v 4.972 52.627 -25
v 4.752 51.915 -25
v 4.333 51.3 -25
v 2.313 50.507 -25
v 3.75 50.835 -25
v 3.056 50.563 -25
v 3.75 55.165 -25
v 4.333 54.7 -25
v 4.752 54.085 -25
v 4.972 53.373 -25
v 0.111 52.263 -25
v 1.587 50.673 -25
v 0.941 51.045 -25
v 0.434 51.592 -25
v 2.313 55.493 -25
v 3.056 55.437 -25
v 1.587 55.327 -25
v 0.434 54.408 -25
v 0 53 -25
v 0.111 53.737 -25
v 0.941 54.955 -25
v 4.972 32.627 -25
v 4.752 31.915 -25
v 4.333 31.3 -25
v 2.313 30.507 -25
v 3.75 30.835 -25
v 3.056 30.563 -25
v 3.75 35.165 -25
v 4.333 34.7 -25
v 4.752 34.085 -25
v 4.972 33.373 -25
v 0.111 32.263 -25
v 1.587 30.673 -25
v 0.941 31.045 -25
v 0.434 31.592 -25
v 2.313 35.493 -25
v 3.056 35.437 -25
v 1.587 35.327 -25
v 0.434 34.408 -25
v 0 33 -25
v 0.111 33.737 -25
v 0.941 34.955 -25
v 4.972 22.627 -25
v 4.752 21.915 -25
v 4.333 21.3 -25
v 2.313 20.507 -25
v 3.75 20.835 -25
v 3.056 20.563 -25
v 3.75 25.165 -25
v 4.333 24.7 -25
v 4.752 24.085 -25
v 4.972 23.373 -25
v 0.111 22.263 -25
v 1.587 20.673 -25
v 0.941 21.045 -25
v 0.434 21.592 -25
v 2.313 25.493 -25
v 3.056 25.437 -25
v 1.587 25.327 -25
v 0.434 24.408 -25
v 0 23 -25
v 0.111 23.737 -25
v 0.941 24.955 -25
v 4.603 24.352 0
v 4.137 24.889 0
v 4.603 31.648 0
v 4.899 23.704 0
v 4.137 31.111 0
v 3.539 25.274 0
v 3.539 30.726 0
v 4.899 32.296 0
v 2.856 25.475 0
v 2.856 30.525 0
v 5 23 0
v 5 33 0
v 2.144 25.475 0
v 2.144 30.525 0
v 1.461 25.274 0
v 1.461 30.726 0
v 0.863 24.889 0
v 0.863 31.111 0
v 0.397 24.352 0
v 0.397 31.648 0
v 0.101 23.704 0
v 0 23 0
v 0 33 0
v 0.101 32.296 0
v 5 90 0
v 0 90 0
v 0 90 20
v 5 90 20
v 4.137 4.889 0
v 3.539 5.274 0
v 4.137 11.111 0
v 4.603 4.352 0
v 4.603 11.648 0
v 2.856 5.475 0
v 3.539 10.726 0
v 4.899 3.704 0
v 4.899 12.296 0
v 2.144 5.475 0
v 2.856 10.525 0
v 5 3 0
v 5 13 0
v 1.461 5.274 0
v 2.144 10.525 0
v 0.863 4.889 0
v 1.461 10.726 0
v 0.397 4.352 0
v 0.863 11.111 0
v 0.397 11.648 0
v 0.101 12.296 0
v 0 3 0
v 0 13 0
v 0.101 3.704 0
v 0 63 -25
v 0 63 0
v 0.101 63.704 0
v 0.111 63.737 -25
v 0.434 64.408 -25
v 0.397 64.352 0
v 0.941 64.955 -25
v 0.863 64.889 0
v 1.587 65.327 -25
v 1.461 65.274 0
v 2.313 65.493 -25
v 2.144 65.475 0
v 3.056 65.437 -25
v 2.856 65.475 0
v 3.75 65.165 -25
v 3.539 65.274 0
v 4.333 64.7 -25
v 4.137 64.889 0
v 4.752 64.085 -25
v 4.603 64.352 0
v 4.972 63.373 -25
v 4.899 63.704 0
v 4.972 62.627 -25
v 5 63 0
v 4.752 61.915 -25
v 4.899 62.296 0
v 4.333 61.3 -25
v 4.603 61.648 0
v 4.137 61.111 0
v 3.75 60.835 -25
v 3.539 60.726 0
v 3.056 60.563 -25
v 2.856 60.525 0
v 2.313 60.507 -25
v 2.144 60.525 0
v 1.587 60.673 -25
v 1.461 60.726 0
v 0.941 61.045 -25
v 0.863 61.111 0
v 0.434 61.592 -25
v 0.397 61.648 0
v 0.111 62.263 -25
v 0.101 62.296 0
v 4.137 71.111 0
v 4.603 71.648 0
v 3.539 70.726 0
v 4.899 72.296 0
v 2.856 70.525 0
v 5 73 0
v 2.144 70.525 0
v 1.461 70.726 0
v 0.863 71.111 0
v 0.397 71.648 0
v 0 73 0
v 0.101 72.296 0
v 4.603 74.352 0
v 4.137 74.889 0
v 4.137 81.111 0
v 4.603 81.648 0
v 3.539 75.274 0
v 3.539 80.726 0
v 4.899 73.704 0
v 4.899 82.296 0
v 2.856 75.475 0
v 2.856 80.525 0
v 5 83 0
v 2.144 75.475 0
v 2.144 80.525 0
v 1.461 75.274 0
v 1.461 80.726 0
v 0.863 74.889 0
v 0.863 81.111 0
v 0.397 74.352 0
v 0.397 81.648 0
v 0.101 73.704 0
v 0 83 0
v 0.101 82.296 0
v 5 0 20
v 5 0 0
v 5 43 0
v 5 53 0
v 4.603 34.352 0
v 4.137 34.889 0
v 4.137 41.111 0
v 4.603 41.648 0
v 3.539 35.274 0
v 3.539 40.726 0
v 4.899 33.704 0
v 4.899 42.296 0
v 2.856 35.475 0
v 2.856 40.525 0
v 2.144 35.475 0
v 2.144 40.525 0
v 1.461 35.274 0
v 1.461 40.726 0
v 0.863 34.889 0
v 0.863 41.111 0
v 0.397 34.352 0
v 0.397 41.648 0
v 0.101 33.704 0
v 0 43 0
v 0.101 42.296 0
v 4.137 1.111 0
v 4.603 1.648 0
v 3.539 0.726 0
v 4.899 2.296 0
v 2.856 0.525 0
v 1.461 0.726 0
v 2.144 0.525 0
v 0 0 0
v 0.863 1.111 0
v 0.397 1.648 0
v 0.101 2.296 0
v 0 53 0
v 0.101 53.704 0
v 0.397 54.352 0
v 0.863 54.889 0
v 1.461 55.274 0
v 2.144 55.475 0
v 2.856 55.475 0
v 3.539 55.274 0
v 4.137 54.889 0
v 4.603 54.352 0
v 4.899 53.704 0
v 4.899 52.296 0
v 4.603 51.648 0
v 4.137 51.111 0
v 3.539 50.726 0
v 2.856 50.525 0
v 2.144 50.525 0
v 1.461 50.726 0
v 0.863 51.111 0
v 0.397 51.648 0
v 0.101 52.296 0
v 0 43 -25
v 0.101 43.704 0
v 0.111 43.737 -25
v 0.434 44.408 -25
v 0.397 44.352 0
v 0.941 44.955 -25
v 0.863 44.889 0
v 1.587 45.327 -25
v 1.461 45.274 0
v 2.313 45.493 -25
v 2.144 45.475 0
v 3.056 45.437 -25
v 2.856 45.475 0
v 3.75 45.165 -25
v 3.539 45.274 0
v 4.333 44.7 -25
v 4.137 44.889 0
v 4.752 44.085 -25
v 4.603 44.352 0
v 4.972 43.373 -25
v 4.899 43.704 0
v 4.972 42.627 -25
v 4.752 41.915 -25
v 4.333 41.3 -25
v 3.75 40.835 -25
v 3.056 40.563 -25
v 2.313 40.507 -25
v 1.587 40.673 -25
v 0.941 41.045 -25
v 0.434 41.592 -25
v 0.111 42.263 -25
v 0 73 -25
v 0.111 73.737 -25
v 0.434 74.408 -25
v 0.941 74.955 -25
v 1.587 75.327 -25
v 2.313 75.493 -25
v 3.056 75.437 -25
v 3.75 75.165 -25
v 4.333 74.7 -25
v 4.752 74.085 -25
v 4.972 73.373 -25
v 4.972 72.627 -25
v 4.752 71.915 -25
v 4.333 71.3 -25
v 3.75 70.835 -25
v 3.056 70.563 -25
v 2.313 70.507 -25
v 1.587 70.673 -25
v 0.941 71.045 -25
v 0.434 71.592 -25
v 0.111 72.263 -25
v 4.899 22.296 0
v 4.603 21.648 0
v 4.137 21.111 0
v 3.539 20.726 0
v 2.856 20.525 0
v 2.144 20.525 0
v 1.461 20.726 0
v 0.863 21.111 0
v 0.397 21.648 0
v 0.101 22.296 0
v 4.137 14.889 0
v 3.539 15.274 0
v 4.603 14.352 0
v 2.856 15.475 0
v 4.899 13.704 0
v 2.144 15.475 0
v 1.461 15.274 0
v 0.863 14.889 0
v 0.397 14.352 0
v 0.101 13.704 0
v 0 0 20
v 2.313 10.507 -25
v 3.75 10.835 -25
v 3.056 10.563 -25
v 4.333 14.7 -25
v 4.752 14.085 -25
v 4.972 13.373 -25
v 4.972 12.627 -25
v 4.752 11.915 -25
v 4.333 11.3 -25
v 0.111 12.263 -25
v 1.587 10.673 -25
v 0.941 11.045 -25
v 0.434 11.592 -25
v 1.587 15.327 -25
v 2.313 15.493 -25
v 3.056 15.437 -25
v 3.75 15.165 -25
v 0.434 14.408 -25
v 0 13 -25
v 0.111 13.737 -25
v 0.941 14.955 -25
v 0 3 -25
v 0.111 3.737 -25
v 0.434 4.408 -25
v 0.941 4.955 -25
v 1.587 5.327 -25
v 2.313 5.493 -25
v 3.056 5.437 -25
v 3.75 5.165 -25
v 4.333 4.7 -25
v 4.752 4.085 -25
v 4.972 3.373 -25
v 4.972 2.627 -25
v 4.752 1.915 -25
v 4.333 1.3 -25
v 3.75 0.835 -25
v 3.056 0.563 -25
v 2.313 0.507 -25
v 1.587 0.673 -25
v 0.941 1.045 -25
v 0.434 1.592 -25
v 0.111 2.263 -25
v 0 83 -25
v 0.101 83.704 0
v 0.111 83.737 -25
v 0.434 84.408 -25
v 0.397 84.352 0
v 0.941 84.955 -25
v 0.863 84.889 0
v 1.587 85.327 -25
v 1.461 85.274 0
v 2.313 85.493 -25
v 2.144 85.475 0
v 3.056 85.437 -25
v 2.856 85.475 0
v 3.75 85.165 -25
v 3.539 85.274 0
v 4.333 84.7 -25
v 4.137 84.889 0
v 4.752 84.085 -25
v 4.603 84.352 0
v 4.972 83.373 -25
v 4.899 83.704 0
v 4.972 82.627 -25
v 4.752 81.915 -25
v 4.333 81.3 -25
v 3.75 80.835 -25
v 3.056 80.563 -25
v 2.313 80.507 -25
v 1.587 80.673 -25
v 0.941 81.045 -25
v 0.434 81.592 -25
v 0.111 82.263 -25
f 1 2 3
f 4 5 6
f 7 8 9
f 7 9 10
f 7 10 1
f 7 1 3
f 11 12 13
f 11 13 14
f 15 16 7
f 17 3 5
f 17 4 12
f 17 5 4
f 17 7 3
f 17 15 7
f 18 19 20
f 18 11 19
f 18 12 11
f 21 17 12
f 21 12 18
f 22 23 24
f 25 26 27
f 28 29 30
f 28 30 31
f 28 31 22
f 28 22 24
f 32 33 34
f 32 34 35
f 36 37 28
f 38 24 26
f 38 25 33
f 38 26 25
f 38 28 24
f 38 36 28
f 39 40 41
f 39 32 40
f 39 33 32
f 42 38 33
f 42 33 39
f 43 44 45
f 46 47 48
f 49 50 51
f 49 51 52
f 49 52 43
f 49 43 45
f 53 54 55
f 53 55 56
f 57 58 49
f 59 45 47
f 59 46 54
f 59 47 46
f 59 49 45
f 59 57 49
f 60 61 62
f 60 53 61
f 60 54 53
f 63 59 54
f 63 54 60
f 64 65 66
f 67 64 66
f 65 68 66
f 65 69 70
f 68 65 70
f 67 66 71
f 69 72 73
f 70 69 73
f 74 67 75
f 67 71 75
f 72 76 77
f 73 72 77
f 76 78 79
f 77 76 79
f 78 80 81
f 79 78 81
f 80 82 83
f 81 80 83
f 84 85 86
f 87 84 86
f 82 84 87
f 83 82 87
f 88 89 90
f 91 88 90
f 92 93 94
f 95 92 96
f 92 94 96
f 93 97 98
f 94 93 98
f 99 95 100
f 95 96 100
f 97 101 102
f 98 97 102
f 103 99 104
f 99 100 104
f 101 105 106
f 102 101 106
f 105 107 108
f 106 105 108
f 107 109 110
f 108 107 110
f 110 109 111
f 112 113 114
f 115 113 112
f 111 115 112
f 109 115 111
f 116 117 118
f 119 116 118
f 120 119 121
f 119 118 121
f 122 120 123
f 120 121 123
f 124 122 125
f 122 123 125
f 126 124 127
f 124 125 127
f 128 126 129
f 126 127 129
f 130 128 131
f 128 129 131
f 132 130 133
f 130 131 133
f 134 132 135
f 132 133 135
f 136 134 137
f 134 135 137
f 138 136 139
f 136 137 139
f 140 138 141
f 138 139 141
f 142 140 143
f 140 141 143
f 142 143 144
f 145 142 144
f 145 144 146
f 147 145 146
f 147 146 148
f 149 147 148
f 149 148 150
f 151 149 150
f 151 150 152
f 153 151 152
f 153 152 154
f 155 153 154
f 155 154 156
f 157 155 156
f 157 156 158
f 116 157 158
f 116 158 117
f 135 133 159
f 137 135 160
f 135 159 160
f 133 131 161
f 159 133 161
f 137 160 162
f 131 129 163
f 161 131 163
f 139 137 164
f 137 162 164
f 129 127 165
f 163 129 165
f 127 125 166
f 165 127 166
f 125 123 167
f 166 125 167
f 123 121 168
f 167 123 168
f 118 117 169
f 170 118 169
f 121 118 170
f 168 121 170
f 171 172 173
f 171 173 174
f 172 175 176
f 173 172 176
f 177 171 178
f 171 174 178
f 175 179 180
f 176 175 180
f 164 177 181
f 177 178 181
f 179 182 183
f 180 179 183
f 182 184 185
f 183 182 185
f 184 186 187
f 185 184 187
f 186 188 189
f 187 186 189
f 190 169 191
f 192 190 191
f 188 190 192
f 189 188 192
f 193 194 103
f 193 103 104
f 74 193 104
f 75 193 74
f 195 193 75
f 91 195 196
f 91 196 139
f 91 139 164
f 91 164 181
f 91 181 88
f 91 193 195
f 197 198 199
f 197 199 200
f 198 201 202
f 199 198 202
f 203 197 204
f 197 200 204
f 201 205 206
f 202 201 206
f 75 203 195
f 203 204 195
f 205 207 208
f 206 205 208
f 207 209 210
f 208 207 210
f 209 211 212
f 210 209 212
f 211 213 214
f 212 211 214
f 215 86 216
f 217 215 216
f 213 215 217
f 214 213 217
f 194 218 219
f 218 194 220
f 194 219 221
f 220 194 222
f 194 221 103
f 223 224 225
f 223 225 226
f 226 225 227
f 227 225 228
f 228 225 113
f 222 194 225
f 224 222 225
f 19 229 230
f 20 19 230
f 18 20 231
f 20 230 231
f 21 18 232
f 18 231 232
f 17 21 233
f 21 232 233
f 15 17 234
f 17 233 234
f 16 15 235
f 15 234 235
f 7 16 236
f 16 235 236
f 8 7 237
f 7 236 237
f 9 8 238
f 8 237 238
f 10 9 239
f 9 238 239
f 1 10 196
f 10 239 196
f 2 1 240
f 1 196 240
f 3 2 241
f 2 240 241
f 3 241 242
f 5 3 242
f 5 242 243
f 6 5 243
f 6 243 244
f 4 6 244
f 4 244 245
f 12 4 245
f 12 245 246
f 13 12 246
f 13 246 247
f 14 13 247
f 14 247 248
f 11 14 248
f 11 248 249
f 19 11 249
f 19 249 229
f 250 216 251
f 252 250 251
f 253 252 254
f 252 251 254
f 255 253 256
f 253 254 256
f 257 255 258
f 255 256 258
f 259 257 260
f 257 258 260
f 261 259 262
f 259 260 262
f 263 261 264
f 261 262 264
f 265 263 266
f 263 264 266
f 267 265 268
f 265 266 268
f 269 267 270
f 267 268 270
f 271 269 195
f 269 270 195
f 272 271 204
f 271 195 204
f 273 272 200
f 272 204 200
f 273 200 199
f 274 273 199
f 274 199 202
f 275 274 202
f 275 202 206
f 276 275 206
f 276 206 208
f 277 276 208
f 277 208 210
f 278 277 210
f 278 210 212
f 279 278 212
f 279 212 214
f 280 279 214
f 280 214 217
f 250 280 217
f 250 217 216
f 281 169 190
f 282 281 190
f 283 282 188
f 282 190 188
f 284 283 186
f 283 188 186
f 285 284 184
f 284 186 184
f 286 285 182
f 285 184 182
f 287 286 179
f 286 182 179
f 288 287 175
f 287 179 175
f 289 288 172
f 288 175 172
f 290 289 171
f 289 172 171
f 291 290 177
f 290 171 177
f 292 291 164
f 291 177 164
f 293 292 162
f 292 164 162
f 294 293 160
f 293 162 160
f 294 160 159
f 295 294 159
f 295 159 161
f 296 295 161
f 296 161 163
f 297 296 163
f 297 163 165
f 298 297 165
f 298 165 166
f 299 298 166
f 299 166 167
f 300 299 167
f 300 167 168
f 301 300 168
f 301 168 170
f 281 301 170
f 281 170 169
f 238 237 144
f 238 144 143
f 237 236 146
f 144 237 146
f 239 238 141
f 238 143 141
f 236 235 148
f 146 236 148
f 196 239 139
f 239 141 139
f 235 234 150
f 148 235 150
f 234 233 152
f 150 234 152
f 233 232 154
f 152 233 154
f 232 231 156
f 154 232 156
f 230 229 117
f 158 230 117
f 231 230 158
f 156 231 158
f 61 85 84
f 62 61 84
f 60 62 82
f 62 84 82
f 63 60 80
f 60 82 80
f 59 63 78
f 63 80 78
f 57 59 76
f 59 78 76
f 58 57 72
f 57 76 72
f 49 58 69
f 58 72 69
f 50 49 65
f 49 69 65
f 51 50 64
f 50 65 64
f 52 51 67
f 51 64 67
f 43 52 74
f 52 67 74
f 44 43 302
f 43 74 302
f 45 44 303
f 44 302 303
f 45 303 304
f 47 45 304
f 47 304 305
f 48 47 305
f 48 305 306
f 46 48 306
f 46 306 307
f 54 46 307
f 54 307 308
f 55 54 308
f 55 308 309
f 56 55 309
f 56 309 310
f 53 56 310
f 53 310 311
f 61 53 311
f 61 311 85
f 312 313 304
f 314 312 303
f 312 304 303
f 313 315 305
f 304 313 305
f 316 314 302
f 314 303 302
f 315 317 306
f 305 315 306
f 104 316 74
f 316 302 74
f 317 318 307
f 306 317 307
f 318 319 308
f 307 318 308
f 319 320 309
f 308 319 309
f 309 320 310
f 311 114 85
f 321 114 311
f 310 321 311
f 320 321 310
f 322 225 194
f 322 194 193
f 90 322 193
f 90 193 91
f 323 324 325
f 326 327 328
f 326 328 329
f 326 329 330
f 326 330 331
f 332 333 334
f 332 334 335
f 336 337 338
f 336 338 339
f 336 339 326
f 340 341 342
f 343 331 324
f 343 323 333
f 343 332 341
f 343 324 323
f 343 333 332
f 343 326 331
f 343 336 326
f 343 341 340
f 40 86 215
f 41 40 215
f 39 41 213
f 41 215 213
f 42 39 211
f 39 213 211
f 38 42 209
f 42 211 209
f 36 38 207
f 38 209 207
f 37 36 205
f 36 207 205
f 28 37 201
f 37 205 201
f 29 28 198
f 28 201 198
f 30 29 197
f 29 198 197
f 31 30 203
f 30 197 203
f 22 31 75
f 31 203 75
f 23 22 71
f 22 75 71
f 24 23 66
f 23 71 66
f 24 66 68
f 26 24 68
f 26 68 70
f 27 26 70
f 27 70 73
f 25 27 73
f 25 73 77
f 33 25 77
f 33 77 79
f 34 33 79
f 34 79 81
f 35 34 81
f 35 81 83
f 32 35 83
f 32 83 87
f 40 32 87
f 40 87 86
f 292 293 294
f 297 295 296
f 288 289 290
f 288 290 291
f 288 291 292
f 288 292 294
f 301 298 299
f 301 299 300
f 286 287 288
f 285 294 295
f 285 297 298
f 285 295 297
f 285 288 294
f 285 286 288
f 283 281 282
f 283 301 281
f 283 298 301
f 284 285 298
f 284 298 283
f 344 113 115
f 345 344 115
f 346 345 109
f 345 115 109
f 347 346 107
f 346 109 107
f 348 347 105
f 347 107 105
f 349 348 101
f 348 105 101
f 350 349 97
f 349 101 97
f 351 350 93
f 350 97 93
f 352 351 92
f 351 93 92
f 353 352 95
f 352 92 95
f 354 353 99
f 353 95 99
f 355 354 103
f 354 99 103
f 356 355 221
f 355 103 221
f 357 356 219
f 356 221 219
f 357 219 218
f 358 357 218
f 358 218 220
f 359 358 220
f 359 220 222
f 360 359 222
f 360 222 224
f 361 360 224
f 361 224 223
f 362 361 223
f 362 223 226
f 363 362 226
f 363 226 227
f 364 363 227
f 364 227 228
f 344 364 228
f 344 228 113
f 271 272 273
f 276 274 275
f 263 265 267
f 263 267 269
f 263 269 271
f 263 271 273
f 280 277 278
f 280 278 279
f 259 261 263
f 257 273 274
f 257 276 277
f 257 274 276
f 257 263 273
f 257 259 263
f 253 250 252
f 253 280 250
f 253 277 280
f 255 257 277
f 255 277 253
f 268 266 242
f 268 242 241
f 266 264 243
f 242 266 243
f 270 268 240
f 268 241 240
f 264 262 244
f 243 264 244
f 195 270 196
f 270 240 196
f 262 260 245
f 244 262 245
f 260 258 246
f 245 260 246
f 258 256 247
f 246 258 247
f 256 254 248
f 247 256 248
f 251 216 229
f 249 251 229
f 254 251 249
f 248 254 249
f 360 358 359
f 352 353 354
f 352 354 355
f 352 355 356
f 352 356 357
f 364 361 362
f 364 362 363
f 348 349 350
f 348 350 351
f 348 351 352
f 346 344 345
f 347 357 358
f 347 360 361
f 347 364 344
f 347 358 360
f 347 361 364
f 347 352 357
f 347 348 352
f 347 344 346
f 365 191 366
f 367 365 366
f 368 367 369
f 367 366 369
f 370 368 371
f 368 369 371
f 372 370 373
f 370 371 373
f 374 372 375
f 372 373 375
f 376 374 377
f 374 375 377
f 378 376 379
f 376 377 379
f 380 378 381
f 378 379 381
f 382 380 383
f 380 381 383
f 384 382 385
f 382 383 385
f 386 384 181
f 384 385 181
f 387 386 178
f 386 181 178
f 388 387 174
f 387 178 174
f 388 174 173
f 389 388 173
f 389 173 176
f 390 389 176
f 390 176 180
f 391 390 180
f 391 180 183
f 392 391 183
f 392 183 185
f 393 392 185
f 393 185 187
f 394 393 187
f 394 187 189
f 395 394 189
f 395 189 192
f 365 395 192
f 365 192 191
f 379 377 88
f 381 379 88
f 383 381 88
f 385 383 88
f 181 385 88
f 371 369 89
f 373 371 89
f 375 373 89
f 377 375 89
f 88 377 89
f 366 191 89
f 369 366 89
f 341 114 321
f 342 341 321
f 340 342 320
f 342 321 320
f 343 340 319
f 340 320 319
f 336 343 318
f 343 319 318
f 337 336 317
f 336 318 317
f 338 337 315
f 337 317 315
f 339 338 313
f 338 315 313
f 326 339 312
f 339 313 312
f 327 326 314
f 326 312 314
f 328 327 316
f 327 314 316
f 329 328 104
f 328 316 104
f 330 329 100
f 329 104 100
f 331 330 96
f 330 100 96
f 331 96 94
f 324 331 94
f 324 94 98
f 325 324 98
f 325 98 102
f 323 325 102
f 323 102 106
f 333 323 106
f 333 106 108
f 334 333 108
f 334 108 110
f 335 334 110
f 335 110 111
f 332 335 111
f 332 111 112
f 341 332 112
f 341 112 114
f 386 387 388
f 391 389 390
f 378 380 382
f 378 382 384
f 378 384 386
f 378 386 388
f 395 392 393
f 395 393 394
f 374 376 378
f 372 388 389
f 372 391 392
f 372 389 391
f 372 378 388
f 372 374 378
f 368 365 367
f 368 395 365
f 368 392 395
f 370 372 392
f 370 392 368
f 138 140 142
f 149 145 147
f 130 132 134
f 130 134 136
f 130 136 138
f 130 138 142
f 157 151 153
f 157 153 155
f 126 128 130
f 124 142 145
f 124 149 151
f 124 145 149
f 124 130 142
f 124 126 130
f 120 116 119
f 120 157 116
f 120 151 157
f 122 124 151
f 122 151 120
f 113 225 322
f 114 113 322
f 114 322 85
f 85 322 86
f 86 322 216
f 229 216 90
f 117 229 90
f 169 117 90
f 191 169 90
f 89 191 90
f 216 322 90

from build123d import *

# Parameters (mm, degrees)
SKETCH1_W           = 90
SKETCH1_H           = 20
BOSS_EXTRUDE1_DEPTH = 5
SKETCH2_R           = 2.5
BOSS_EXTRUDE2_DEPTH = 25


with BuildPart() as part:
    # Sketch1 → Boss-Extrude1 (new body)
    with BuildSketch(Plane.YZ):
        with Locations((45, 10)):
            Rectangle(SKETCH1_W, SKETCH1_H)
    extrude(amount=BOSS_EXTRUDE1_DEPTH)

    # Sketch2 → Boss-Extrude2 (add)
    with BuildSketch(Plane(origin=(0, 0, 0), x_dir=(1, 0, 0), z_dir=(0, 0, -1))):
        with Locations(Location((2.5, -3, 0), (0, 0, 180))):
            Circle(SKETCH2_R)
        with Locations(Location((2.5, -13, 0), (0, 0, 180))):
            Circle(SKETCH2_R)
        with Locations(Location((2.5, -23, 0), (0, 0, 180))):
            Circle(SKETCH2_R)
        with Locations(Location((2.5, -33, 0), (0, 0, 180))):
            Circle(SKETCH2_R)
        with Locations(Location((2.5, -43, 0), (0, 0, 180))):
            Circle(SKETCH2_R)
        with Locations(Location((2.5, -53, 0), (0, 0, 180))):
            Circle(SKETCH2_R)
        with Locations(Location((2.5, -63, 0), (0, 0, 180))):
            Circle(SKETCH2_R)
        with Locations(Location((2.5, -73, 0), (0, 0, 180))):
            Circle(SKETCH2_R)
        with Locations(Location((2.5, -83, 0), (0, 0, 180))):
            Circle(SKETCH2_R)
    extrude(amount=BOSS_EXTRUDE2_DEPTH)


solid = part.part
